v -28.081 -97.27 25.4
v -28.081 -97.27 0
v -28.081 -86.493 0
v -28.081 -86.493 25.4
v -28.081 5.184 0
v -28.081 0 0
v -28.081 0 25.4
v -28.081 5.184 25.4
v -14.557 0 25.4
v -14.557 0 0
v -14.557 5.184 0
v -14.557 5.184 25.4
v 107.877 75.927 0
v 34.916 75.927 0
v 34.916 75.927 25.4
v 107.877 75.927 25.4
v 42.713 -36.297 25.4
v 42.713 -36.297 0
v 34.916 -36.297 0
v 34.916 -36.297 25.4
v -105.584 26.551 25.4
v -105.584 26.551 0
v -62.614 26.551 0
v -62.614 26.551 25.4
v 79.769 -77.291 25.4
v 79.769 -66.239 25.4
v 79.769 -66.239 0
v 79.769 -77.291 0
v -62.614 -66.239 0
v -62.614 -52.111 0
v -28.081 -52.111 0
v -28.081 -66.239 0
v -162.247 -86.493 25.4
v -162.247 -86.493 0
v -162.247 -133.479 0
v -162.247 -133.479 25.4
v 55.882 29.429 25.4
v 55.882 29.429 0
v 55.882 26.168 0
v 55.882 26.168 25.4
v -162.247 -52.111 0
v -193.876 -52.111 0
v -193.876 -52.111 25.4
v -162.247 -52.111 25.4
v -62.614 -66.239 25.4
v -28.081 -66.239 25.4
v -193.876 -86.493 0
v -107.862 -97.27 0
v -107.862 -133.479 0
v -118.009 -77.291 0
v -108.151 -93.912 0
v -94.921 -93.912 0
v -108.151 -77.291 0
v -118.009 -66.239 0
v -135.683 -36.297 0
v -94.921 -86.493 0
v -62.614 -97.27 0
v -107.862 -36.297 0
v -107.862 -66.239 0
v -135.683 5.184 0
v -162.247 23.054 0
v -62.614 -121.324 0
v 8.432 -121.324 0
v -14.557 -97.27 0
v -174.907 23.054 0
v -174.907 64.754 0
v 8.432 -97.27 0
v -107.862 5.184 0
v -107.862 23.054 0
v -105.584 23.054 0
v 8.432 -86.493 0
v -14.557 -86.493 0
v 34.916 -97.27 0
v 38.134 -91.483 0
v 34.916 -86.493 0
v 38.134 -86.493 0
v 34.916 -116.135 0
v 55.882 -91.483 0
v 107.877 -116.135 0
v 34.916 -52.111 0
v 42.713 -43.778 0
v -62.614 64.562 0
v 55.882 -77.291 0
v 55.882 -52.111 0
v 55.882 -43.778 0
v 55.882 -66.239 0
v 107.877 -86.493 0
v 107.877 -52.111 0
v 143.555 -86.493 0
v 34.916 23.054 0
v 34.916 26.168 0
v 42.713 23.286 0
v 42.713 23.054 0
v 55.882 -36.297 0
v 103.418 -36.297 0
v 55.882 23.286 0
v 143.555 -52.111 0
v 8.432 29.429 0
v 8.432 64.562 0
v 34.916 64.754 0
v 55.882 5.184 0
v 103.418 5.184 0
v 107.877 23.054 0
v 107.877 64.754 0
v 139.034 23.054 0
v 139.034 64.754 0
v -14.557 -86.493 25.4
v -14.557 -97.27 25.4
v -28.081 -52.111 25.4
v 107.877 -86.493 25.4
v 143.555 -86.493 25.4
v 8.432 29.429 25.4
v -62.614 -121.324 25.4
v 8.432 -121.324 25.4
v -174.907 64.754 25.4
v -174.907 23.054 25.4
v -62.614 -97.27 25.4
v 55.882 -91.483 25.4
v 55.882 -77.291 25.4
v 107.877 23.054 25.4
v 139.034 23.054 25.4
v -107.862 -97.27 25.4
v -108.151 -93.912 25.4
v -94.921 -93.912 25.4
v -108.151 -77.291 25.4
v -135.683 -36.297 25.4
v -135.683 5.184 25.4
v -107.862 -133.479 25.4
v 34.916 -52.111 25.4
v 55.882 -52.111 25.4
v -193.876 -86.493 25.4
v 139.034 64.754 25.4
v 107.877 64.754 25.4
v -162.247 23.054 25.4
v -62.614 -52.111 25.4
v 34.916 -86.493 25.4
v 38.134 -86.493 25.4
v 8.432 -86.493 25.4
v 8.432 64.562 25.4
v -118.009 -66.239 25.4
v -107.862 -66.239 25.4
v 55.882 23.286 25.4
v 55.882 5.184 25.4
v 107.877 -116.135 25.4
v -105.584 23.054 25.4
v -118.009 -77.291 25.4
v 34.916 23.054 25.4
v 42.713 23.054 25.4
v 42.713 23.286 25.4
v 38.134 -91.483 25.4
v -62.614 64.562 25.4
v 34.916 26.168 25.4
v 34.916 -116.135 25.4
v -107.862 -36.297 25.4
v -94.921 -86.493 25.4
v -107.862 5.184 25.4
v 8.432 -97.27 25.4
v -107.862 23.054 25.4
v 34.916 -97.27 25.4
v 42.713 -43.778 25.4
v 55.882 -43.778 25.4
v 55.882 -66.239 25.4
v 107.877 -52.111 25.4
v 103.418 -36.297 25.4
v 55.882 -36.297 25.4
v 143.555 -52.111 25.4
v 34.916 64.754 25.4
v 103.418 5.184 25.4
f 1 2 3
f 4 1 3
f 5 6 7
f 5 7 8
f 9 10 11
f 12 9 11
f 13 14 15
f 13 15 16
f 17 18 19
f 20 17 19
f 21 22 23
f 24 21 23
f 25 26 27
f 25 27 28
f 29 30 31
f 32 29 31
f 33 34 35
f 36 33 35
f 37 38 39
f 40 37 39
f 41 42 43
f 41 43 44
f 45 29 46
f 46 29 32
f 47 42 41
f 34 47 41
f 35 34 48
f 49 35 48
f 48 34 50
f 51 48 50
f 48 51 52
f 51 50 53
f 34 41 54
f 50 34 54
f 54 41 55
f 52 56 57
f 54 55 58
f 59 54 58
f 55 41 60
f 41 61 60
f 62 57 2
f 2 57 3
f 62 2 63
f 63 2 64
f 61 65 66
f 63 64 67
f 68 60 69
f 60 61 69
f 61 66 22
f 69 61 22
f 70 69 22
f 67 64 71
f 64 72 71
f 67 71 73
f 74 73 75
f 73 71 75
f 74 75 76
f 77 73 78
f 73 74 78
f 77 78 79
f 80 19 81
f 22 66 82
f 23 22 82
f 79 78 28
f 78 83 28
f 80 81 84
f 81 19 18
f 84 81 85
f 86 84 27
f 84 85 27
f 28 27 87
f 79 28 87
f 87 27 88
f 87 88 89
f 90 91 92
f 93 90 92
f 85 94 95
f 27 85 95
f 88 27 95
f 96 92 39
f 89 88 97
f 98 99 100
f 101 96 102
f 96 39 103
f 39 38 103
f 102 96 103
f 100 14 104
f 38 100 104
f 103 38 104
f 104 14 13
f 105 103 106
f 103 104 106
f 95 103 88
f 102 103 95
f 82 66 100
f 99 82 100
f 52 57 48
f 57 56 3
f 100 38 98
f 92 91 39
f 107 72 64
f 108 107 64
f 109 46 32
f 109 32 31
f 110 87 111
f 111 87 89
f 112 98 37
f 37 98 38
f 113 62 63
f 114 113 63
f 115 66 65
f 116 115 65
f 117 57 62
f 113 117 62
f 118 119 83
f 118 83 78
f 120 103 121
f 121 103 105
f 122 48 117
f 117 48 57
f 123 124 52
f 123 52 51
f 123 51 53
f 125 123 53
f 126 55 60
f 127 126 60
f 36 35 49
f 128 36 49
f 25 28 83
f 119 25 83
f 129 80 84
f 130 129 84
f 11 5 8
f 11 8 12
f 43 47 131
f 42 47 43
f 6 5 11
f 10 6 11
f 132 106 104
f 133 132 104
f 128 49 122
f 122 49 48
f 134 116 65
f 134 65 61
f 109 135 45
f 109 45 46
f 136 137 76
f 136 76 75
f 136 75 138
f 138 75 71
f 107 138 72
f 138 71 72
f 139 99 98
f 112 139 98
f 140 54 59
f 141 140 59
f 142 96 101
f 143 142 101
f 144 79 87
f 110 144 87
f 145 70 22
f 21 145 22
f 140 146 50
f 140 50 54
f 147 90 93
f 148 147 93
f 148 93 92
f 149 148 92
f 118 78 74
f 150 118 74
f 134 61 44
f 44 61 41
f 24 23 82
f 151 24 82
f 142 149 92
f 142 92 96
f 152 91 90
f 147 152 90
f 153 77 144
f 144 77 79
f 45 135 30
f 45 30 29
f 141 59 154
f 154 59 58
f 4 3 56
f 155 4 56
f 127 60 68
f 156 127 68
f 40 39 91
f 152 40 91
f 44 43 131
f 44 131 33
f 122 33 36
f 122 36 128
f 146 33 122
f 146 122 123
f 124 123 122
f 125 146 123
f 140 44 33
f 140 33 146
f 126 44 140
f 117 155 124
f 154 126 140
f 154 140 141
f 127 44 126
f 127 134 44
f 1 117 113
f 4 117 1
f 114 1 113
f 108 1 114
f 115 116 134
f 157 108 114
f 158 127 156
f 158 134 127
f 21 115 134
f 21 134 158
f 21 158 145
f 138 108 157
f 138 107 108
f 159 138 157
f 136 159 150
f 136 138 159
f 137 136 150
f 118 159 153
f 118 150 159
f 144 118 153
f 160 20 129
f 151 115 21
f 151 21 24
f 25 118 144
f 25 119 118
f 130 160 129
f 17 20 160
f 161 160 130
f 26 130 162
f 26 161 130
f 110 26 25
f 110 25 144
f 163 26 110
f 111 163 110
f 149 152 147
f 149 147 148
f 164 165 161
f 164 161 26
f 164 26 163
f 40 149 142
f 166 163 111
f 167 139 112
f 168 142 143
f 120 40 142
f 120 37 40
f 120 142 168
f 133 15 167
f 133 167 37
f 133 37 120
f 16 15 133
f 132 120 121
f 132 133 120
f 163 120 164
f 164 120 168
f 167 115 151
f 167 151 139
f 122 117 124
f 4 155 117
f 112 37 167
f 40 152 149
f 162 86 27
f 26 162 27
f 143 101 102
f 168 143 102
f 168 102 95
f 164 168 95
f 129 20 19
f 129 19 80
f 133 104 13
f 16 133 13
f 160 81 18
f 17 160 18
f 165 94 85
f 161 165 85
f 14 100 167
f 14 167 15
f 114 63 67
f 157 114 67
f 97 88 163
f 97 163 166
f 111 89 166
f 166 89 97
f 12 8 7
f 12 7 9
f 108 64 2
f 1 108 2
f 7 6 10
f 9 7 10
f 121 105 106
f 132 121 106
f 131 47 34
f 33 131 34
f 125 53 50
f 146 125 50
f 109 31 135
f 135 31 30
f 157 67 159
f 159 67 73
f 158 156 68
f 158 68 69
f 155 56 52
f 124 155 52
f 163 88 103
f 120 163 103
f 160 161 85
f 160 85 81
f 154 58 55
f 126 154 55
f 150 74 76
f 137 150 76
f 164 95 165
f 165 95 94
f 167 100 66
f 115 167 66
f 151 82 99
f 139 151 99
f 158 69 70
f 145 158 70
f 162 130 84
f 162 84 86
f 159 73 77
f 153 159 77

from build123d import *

# Parameters (mm, degrees)
F0_W     = 54.3858930469
F0_H     = 34.2406090349
F0_W_2   = 31.1571955681
F0_H_2   = 41.6999291629
F0_W_3   = 72.9609392583
F0_H_3   = 11.1721456051
F0_W_4   = 26.4839343727
F0_H_4   = 10.7772946358
F0_W_5   = 31.6282212734
F0_H_5   = 34.3817844987
F0_W_6   = 35.6785953045
F1_DEPTH = 25.4
F0_W_7   = 13.523530215
F0_H_6   = 5.1841237582


with BuildPart() as f1:
    # F0 (on Top) → F1 (new body)
    with BuildSketch(Plane.XY):
        Polygon((34.915599972, 26.1683743447), (34.915599972, 23.0544600636), (42.7131541073, 23.0544600636), (42.7131541073, 23.2863482088), (55.8821521699, 23.2863482088), (55.8821521699, 23.0544600636), (107.8765392303, 23.0544600636), (107.8765392303, 64.7543892264), (34.915599972, 64.7543892264), (34.915599972, 29.4287577271), (55.8821521699, 29.4287577271), (55.8821521699, 26.1683743447), align=None)
        Polygon((42.7131541073, -36.2965688109), (34.915599972, -36.2965688109), (34.915599972, -52.1109029651), (38.1341129541, -52.1109029651), (55.8821521699, -52.1109029651), (107.8765392303, -52.1109029651), (107.8765392303, 23.0544600636), (55.8821521699, 23.0544600636), (55.8821521699, 5.1841237582), (103.417776525, 5.1841237582), (103.417776525, -36.2965688109), (55.8821521699, -36.2965688109), (55.8821521699, -43.7775962055), (42.7131541073, -43.7775962055), align=None)
        Polygon((-135.6828808784, 5.1841237582), (-107.8615859151, 5.1841237582), (-107.8615859151, 23.0544600636), (-162.2474789619, 23.0544600636), (-162.2474789619, -52.1109029651), (-107.8615859151, -52.1109029651), (-107.8615859151, -36.2965688109), (-135.6828808784, -36.2965688109), align=None)
        Polygon((-105.583652854, 26.5505686402), (-62.614031136, 26.5505686402), (-62.614031136, 64.5622834563), (8.4316655993, 64.5622834563), (8.4316655993, 29.4287577271), (34.915599972, 29.4287577271), (34.915599972, 64.7543892264), (-174.906656146, 64.7543892264), (-174.906656146, 23.0544600636), (-162.2474789619, 23.0544600636), (-162.2474789619, 57.2950690985), (-107.8615859151, 57.2950690985), (-107.8615859151, 23.0544600636), (-105.583652854, 23.0544600636), align=None)
        with Locations((-135.0545324385, 40.174764581)):
            Rectangle(F0_W, F0_H)
        Polygon((-107.8615859151, -65.1790574193), (-107.8615859151, -52.1109029651), (-162.2474789619, -52.1109029651), (-162.2474789619, -86.4926874638), (-108.1507131457, -86.4926874638), (-108.1507131457, -77.2911310196), (-118.0093511939, -77.2911310196), (-118.0093511939, -66.2388503551), (-107.8615859151, -66.2388503551), align=None)
        with Locations((123.4551370144, 43.904424645)):
            Rectangle(F0_W_2, F0_H_2)
        with Locations((71.3960696012, 70.340462029)):
            Rectangle(F0_W_3, F0_H_3)
        Polygon((8.4316655993, -86.4926874638), (-14.5569872111, -86.4926874638), (-14.5569872111, -97.2699820995), (-28.0805174261, -97.2699820995), (-28.0805174261, -86.4926874638), (-62.614031136, -86.4926874638), (-62.614031136, -97.2699820995), (-62.614031136, -121.3240176439), (8.4316655993, -121.3240176439), (8.4316655993, -97.2699820995), align=None)
        with Locations((21.6736327857, -91.8813347816)):
            Rectangle(F0_W_4, F0_H_4)
        Polygon((107.8765392303, -52.1109029651), (55.8821521699, -52.1109029651), (55.8821521699, -66.2388503551), (79.7686055303, -66.2388503551), (79.7686055303, -77.2911310196), (55.8821521699, -77.2911310196), (55.8821521699, -86.4926874638), (107.8765392303, -86.4926874638), align=None)
        with Locations((-178.0615895987, -69.3017952144)):
            Rectangle(F0_W_5, F0_H_5)
        with Locations((125.7158368826, -69.3017952144)):
            Rectangle(F0_W_6, F0_H_5)
        Polygon((38.1341129541, -86.4926874638), (34.915599972, -86.4926874638), (34.915599972, -97.2699820995), (34.915599972, -116.1351576447), (107.8765392303, -116.1351576447), (107.8765392303, -86.4926874638), (55.8821521699, -86.4926874638), (55.8821521699, -91.4830863476), (38.1341129541, -91.4830863476), align=None)
        Polygon((-108.1507131457, -86.4926874638), (-162.2474789619, -86.4926874638), (-162.2474789619, -133.4793567657), (-107.8615859151, -133.4793567657), (-107.8615859151, -97.2699820995), (-107.8615859151, -93.911677599), (-108.1507131457, -93.911677599), align=None)
        Polygon((-62.614031136, -97.2699820995), (-62.614031136, -86.4926874638), (-94.9210748076, -86.4926874638), (-94.9210748076, -93.911677599), (-107.8615859151, -93.911677599), (-107.8615859151, -97.2699820995), align=None)
    extrude(amount=F1_DEPTH)


with BuildPart() as f1b:
    # F0 (on Top) → F1, piece 2 (new body)
    with BuildSketch(Plane.XY):
        with Locations((-21.3187523186, 2.5920618791)):
            Rectangle(F0_W_7, F0_H_6)
    extrude(amount=F1_DEPTH)


with BuildPart() as f1c:
    # F0 (on Top) → F1, piece 3 (new body)
    with BuildSketch(Plane.XY):
        Polygon((-28.0805174261, -66.2388503551), (-28.0805174261, -52.1109029651), (-39.6157763898, -52.1109029651), (-62.614031136, -52.1109029651), (-62.614031136, -66.2388503551), align=None)
    extrude(amount=F1_DEPTH)


solid = Compound([f1.part, f1b.part, f1c.part])
